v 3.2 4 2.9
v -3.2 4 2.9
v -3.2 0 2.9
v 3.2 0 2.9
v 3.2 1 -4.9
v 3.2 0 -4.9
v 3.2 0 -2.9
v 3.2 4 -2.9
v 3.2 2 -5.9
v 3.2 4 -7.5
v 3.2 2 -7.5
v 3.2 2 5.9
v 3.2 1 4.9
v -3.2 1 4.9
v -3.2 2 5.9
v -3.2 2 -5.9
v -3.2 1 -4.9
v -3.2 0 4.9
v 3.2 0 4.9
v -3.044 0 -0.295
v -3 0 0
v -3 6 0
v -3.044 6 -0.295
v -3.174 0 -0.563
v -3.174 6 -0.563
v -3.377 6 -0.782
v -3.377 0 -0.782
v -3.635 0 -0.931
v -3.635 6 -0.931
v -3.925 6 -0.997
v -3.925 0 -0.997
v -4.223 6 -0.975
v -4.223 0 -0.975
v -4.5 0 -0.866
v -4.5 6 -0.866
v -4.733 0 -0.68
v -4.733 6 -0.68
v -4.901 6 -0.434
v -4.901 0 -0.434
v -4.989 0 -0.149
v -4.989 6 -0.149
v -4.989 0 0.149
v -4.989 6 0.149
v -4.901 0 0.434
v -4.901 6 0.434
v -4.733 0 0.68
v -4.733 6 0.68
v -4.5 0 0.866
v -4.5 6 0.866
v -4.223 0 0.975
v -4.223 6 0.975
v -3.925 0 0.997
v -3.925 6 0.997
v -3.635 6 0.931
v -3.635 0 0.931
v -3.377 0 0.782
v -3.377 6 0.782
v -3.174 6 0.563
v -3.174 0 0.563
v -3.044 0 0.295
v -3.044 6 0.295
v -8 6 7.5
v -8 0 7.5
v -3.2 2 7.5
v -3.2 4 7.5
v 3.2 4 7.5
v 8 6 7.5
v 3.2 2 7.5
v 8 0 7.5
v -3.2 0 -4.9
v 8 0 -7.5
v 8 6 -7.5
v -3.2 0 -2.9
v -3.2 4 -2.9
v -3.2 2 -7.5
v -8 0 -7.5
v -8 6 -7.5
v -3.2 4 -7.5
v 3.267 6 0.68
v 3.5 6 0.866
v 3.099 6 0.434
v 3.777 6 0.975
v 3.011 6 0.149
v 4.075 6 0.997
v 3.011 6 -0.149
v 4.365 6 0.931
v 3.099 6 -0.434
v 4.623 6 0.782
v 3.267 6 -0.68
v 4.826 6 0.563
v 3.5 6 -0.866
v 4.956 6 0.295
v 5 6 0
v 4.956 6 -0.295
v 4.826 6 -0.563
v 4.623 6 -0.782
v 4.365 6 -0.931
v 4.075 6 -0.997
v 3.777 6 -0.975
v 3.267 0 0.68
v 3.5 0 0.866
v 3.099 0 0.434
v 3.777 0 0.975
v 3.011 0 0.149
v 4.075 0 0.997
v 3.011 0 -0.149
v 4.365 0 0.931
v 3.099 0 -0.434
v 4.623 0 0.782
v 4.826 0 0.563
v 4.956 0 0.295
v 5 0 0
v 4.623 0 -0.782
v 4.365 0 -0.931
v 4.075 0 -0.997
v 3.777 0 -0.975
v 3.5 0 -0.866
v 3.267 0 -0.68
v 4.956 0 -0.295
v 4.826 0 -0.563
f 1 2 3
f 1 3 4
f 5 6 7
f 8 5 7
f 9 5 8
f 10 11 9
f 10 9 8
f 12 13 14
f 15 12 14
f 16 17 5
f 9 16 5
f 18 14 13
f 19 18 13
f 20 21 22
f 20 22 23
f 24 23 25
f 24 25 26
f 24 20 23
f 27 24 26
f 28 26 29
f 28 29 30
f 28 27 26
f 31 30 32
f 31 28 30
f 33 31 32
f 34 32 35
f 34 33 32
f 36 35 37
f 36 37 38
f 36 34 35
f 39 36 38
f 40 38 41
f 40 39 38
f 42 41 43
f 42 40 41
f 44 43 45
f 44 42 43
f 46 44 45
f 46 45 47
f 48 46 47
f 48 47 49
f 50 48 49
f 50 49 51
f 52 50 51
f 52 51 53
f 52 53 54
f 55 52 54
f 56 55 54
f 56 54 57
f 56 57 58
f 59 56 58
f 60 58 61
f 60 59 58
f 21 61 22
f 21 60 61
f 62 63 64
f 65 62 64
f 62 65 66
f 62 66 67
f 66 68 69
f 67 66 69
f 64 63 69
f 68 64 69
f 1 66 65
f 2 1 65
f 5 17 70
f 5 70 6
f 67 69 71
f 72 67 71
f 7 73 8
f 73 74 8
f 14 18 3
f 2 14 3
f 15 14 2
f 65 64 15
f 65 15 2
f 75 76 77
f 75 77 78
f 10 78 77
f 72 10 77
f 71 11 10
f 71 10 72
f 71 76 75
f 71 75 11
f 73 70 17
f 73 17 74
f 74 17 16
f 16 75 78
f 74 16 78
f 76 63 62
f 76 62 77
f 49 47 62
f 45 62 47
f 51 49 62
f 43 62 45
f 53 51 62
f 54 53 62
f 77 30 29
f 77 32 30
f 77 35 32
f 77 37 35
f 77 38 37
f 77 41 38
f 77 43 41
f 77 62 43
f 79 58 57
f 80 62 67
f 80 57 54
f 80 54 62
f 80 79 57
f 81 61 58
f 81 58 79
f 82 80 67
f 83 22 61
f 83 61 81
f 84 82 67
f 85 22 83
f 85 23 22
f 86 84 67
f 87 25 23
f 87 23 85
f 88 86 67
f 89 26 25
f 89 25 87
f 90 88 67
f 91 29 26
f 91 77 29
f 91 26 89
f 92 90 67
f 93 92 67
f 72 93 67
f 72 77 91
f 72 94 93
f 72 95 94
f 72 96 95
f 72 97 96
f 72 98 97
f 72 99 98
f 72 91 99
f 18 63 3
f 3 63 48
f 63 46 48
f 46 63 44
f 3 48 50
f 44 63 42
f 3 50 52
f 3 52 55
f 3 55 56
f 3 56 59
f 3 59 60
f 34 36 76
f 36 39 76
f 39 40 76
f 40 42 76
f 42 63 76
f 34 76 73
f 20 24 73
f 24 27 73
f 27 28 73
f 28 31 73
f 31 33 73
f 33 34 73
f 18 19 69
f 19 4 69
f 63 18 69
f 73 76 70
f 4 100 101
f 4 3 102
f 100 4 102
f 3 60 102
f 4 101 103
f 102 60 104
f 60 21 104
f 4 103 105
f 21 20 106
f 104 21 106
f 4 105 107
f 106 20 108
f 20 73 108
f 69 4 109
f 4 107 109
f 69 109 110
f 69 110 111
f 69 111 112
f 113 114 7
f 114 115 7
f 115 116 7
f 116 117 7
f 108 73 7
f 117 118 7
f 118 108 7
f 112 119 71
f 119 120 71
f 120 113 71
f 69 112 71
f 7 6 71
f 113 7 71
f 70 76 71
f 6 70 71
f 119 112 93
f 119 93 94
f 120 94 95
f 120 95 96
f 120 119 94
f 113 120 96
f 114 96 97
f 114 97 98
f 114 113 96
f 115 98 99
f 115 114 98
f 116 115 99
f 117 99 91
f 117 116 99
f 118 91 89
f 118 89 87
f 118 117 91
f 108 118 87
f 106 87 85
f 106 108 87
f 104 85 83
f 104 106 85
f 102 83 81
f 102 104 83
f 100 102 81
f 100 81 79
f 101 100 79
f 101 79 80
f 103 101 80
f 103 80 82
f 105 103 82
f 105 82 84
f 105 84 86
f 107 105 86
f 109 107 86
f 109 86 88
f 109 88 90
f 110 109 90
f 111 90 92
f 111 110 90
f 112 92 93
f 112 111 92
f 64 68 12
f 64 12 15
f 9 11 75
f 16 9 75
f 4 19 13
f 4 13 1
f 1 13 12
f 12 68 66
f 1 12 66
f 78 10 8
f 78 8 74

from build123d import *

# Parameters (mm, degrees)
CROQUIS1_W              = 16
CROQUIS1_H              = 15
CROQUIS1_R              = 1
SALIENTE_EXTRUIR1_DEPTH = 6
CROQUIS6_W              = 6.4
CROQUIS6_H              = 2
CORTAR_EXTRUIR3_DEPTH   = 32
CROQUIS7_W              = 6.4
CROQUIS7_H              = 2
CORTAR_EXTRUIR4_DEPTH   = 4.6
CROQUIS8_W              = 6.4
CROQUIS8_H              = 2
SALIENTE_EXTRUIR5_DEPTH = 2
CHAFL_N1_SIZE           = 1


with BuildPart() as part:
    # Croquis1 → Saliente-Extruir1 (new body)
    with BuildSketch(Plane(origin=(0, 0, 0), x_dir=(1, 0, 0), z_dir=(0, 1, 0))):
        Rectangle(CROQUIS1_W, CROQUIS1_H)
        with Locations((4, 0)):
            Circle(CROQUIS1_R, mode=Mode.SUBTRACT)
        with Locations((-4, 0)):
            Circle(CROQUIS1_R, mode=Mode.SUBTRACT)
    extrude(amount=SALIENTE_EXTRUIR1_DEPTH)

    # Croquis6 → Cortar-Extruir3 (cut)
    with BuildSketch(Plane(origin=(0, 6, 0), x_dir=(1, 0, 0), z_dir=(0, 1, 0))):
        with Locations((0, -3.9)):
            Rectangle(CROQUIS6_W, CROQUIS6_H)
        with Locations((0, 3.9)):
            Rectangle(CROQUIS6_W, CROQUIS6_H)
    cortar_extruir3 = extrude(amount=-CORTAR_EXTRUIR3_DEPTH, mode=Mode.SUBTRACT)

    # Croquis7 → Cortar-Extruir4 (cut)
    with BuildSketch(Plane(origin=(0, 0, 7.5), x_dir=(-1, 0, 0), z_dir=(0, 0, -1))):
        with Locations((0, 3)):
            Rectangle(CROQUIS7_W, CROQUIS7_H)
    cortar_extruir4 = extrude(amount=CORTAR_EXTRUIR4_DEPTH, mode=Mode.SUBTRACT)

    # Simetría1: Cortar-Extruir3, Cortar-Extruir4 across plane
    add(cortar_extruir3.mirror(Plane.XY), mode=Mode.SUBTRACT)
    add(cortar_extruir4.mirror(Plane.XY), mode=Mode.SUBTRACT)

    # Croquis8 → Saliente-Extruir5 (add)
    with BuildSketch(Plane(origin=(0, 6, 0), x_dir=(1, 0, 0), z_dir=(0, 1, 0))):
        with Locations((0, 3.9)):
            Rectangle(CROQUIS8_W, CROQUIS8_H)
        with Locations((0, -3.9)):
            Rectangle(CROQUIS8_W, CROQUIS8_H)
    extrude(amount=-SALIENTE_EXTRUIR5_DEPTH)

    # Chaflán1
    chafl_n1_edges = [part.edges().sort_by_distance(p)[0] for p in [
        (0, 2, -4.9),
        (0, 2, 4.9),
    ]]
    chamfer(chafl_n1_edges, length=CHAFL_N1_SIZE)


solid = part.part
